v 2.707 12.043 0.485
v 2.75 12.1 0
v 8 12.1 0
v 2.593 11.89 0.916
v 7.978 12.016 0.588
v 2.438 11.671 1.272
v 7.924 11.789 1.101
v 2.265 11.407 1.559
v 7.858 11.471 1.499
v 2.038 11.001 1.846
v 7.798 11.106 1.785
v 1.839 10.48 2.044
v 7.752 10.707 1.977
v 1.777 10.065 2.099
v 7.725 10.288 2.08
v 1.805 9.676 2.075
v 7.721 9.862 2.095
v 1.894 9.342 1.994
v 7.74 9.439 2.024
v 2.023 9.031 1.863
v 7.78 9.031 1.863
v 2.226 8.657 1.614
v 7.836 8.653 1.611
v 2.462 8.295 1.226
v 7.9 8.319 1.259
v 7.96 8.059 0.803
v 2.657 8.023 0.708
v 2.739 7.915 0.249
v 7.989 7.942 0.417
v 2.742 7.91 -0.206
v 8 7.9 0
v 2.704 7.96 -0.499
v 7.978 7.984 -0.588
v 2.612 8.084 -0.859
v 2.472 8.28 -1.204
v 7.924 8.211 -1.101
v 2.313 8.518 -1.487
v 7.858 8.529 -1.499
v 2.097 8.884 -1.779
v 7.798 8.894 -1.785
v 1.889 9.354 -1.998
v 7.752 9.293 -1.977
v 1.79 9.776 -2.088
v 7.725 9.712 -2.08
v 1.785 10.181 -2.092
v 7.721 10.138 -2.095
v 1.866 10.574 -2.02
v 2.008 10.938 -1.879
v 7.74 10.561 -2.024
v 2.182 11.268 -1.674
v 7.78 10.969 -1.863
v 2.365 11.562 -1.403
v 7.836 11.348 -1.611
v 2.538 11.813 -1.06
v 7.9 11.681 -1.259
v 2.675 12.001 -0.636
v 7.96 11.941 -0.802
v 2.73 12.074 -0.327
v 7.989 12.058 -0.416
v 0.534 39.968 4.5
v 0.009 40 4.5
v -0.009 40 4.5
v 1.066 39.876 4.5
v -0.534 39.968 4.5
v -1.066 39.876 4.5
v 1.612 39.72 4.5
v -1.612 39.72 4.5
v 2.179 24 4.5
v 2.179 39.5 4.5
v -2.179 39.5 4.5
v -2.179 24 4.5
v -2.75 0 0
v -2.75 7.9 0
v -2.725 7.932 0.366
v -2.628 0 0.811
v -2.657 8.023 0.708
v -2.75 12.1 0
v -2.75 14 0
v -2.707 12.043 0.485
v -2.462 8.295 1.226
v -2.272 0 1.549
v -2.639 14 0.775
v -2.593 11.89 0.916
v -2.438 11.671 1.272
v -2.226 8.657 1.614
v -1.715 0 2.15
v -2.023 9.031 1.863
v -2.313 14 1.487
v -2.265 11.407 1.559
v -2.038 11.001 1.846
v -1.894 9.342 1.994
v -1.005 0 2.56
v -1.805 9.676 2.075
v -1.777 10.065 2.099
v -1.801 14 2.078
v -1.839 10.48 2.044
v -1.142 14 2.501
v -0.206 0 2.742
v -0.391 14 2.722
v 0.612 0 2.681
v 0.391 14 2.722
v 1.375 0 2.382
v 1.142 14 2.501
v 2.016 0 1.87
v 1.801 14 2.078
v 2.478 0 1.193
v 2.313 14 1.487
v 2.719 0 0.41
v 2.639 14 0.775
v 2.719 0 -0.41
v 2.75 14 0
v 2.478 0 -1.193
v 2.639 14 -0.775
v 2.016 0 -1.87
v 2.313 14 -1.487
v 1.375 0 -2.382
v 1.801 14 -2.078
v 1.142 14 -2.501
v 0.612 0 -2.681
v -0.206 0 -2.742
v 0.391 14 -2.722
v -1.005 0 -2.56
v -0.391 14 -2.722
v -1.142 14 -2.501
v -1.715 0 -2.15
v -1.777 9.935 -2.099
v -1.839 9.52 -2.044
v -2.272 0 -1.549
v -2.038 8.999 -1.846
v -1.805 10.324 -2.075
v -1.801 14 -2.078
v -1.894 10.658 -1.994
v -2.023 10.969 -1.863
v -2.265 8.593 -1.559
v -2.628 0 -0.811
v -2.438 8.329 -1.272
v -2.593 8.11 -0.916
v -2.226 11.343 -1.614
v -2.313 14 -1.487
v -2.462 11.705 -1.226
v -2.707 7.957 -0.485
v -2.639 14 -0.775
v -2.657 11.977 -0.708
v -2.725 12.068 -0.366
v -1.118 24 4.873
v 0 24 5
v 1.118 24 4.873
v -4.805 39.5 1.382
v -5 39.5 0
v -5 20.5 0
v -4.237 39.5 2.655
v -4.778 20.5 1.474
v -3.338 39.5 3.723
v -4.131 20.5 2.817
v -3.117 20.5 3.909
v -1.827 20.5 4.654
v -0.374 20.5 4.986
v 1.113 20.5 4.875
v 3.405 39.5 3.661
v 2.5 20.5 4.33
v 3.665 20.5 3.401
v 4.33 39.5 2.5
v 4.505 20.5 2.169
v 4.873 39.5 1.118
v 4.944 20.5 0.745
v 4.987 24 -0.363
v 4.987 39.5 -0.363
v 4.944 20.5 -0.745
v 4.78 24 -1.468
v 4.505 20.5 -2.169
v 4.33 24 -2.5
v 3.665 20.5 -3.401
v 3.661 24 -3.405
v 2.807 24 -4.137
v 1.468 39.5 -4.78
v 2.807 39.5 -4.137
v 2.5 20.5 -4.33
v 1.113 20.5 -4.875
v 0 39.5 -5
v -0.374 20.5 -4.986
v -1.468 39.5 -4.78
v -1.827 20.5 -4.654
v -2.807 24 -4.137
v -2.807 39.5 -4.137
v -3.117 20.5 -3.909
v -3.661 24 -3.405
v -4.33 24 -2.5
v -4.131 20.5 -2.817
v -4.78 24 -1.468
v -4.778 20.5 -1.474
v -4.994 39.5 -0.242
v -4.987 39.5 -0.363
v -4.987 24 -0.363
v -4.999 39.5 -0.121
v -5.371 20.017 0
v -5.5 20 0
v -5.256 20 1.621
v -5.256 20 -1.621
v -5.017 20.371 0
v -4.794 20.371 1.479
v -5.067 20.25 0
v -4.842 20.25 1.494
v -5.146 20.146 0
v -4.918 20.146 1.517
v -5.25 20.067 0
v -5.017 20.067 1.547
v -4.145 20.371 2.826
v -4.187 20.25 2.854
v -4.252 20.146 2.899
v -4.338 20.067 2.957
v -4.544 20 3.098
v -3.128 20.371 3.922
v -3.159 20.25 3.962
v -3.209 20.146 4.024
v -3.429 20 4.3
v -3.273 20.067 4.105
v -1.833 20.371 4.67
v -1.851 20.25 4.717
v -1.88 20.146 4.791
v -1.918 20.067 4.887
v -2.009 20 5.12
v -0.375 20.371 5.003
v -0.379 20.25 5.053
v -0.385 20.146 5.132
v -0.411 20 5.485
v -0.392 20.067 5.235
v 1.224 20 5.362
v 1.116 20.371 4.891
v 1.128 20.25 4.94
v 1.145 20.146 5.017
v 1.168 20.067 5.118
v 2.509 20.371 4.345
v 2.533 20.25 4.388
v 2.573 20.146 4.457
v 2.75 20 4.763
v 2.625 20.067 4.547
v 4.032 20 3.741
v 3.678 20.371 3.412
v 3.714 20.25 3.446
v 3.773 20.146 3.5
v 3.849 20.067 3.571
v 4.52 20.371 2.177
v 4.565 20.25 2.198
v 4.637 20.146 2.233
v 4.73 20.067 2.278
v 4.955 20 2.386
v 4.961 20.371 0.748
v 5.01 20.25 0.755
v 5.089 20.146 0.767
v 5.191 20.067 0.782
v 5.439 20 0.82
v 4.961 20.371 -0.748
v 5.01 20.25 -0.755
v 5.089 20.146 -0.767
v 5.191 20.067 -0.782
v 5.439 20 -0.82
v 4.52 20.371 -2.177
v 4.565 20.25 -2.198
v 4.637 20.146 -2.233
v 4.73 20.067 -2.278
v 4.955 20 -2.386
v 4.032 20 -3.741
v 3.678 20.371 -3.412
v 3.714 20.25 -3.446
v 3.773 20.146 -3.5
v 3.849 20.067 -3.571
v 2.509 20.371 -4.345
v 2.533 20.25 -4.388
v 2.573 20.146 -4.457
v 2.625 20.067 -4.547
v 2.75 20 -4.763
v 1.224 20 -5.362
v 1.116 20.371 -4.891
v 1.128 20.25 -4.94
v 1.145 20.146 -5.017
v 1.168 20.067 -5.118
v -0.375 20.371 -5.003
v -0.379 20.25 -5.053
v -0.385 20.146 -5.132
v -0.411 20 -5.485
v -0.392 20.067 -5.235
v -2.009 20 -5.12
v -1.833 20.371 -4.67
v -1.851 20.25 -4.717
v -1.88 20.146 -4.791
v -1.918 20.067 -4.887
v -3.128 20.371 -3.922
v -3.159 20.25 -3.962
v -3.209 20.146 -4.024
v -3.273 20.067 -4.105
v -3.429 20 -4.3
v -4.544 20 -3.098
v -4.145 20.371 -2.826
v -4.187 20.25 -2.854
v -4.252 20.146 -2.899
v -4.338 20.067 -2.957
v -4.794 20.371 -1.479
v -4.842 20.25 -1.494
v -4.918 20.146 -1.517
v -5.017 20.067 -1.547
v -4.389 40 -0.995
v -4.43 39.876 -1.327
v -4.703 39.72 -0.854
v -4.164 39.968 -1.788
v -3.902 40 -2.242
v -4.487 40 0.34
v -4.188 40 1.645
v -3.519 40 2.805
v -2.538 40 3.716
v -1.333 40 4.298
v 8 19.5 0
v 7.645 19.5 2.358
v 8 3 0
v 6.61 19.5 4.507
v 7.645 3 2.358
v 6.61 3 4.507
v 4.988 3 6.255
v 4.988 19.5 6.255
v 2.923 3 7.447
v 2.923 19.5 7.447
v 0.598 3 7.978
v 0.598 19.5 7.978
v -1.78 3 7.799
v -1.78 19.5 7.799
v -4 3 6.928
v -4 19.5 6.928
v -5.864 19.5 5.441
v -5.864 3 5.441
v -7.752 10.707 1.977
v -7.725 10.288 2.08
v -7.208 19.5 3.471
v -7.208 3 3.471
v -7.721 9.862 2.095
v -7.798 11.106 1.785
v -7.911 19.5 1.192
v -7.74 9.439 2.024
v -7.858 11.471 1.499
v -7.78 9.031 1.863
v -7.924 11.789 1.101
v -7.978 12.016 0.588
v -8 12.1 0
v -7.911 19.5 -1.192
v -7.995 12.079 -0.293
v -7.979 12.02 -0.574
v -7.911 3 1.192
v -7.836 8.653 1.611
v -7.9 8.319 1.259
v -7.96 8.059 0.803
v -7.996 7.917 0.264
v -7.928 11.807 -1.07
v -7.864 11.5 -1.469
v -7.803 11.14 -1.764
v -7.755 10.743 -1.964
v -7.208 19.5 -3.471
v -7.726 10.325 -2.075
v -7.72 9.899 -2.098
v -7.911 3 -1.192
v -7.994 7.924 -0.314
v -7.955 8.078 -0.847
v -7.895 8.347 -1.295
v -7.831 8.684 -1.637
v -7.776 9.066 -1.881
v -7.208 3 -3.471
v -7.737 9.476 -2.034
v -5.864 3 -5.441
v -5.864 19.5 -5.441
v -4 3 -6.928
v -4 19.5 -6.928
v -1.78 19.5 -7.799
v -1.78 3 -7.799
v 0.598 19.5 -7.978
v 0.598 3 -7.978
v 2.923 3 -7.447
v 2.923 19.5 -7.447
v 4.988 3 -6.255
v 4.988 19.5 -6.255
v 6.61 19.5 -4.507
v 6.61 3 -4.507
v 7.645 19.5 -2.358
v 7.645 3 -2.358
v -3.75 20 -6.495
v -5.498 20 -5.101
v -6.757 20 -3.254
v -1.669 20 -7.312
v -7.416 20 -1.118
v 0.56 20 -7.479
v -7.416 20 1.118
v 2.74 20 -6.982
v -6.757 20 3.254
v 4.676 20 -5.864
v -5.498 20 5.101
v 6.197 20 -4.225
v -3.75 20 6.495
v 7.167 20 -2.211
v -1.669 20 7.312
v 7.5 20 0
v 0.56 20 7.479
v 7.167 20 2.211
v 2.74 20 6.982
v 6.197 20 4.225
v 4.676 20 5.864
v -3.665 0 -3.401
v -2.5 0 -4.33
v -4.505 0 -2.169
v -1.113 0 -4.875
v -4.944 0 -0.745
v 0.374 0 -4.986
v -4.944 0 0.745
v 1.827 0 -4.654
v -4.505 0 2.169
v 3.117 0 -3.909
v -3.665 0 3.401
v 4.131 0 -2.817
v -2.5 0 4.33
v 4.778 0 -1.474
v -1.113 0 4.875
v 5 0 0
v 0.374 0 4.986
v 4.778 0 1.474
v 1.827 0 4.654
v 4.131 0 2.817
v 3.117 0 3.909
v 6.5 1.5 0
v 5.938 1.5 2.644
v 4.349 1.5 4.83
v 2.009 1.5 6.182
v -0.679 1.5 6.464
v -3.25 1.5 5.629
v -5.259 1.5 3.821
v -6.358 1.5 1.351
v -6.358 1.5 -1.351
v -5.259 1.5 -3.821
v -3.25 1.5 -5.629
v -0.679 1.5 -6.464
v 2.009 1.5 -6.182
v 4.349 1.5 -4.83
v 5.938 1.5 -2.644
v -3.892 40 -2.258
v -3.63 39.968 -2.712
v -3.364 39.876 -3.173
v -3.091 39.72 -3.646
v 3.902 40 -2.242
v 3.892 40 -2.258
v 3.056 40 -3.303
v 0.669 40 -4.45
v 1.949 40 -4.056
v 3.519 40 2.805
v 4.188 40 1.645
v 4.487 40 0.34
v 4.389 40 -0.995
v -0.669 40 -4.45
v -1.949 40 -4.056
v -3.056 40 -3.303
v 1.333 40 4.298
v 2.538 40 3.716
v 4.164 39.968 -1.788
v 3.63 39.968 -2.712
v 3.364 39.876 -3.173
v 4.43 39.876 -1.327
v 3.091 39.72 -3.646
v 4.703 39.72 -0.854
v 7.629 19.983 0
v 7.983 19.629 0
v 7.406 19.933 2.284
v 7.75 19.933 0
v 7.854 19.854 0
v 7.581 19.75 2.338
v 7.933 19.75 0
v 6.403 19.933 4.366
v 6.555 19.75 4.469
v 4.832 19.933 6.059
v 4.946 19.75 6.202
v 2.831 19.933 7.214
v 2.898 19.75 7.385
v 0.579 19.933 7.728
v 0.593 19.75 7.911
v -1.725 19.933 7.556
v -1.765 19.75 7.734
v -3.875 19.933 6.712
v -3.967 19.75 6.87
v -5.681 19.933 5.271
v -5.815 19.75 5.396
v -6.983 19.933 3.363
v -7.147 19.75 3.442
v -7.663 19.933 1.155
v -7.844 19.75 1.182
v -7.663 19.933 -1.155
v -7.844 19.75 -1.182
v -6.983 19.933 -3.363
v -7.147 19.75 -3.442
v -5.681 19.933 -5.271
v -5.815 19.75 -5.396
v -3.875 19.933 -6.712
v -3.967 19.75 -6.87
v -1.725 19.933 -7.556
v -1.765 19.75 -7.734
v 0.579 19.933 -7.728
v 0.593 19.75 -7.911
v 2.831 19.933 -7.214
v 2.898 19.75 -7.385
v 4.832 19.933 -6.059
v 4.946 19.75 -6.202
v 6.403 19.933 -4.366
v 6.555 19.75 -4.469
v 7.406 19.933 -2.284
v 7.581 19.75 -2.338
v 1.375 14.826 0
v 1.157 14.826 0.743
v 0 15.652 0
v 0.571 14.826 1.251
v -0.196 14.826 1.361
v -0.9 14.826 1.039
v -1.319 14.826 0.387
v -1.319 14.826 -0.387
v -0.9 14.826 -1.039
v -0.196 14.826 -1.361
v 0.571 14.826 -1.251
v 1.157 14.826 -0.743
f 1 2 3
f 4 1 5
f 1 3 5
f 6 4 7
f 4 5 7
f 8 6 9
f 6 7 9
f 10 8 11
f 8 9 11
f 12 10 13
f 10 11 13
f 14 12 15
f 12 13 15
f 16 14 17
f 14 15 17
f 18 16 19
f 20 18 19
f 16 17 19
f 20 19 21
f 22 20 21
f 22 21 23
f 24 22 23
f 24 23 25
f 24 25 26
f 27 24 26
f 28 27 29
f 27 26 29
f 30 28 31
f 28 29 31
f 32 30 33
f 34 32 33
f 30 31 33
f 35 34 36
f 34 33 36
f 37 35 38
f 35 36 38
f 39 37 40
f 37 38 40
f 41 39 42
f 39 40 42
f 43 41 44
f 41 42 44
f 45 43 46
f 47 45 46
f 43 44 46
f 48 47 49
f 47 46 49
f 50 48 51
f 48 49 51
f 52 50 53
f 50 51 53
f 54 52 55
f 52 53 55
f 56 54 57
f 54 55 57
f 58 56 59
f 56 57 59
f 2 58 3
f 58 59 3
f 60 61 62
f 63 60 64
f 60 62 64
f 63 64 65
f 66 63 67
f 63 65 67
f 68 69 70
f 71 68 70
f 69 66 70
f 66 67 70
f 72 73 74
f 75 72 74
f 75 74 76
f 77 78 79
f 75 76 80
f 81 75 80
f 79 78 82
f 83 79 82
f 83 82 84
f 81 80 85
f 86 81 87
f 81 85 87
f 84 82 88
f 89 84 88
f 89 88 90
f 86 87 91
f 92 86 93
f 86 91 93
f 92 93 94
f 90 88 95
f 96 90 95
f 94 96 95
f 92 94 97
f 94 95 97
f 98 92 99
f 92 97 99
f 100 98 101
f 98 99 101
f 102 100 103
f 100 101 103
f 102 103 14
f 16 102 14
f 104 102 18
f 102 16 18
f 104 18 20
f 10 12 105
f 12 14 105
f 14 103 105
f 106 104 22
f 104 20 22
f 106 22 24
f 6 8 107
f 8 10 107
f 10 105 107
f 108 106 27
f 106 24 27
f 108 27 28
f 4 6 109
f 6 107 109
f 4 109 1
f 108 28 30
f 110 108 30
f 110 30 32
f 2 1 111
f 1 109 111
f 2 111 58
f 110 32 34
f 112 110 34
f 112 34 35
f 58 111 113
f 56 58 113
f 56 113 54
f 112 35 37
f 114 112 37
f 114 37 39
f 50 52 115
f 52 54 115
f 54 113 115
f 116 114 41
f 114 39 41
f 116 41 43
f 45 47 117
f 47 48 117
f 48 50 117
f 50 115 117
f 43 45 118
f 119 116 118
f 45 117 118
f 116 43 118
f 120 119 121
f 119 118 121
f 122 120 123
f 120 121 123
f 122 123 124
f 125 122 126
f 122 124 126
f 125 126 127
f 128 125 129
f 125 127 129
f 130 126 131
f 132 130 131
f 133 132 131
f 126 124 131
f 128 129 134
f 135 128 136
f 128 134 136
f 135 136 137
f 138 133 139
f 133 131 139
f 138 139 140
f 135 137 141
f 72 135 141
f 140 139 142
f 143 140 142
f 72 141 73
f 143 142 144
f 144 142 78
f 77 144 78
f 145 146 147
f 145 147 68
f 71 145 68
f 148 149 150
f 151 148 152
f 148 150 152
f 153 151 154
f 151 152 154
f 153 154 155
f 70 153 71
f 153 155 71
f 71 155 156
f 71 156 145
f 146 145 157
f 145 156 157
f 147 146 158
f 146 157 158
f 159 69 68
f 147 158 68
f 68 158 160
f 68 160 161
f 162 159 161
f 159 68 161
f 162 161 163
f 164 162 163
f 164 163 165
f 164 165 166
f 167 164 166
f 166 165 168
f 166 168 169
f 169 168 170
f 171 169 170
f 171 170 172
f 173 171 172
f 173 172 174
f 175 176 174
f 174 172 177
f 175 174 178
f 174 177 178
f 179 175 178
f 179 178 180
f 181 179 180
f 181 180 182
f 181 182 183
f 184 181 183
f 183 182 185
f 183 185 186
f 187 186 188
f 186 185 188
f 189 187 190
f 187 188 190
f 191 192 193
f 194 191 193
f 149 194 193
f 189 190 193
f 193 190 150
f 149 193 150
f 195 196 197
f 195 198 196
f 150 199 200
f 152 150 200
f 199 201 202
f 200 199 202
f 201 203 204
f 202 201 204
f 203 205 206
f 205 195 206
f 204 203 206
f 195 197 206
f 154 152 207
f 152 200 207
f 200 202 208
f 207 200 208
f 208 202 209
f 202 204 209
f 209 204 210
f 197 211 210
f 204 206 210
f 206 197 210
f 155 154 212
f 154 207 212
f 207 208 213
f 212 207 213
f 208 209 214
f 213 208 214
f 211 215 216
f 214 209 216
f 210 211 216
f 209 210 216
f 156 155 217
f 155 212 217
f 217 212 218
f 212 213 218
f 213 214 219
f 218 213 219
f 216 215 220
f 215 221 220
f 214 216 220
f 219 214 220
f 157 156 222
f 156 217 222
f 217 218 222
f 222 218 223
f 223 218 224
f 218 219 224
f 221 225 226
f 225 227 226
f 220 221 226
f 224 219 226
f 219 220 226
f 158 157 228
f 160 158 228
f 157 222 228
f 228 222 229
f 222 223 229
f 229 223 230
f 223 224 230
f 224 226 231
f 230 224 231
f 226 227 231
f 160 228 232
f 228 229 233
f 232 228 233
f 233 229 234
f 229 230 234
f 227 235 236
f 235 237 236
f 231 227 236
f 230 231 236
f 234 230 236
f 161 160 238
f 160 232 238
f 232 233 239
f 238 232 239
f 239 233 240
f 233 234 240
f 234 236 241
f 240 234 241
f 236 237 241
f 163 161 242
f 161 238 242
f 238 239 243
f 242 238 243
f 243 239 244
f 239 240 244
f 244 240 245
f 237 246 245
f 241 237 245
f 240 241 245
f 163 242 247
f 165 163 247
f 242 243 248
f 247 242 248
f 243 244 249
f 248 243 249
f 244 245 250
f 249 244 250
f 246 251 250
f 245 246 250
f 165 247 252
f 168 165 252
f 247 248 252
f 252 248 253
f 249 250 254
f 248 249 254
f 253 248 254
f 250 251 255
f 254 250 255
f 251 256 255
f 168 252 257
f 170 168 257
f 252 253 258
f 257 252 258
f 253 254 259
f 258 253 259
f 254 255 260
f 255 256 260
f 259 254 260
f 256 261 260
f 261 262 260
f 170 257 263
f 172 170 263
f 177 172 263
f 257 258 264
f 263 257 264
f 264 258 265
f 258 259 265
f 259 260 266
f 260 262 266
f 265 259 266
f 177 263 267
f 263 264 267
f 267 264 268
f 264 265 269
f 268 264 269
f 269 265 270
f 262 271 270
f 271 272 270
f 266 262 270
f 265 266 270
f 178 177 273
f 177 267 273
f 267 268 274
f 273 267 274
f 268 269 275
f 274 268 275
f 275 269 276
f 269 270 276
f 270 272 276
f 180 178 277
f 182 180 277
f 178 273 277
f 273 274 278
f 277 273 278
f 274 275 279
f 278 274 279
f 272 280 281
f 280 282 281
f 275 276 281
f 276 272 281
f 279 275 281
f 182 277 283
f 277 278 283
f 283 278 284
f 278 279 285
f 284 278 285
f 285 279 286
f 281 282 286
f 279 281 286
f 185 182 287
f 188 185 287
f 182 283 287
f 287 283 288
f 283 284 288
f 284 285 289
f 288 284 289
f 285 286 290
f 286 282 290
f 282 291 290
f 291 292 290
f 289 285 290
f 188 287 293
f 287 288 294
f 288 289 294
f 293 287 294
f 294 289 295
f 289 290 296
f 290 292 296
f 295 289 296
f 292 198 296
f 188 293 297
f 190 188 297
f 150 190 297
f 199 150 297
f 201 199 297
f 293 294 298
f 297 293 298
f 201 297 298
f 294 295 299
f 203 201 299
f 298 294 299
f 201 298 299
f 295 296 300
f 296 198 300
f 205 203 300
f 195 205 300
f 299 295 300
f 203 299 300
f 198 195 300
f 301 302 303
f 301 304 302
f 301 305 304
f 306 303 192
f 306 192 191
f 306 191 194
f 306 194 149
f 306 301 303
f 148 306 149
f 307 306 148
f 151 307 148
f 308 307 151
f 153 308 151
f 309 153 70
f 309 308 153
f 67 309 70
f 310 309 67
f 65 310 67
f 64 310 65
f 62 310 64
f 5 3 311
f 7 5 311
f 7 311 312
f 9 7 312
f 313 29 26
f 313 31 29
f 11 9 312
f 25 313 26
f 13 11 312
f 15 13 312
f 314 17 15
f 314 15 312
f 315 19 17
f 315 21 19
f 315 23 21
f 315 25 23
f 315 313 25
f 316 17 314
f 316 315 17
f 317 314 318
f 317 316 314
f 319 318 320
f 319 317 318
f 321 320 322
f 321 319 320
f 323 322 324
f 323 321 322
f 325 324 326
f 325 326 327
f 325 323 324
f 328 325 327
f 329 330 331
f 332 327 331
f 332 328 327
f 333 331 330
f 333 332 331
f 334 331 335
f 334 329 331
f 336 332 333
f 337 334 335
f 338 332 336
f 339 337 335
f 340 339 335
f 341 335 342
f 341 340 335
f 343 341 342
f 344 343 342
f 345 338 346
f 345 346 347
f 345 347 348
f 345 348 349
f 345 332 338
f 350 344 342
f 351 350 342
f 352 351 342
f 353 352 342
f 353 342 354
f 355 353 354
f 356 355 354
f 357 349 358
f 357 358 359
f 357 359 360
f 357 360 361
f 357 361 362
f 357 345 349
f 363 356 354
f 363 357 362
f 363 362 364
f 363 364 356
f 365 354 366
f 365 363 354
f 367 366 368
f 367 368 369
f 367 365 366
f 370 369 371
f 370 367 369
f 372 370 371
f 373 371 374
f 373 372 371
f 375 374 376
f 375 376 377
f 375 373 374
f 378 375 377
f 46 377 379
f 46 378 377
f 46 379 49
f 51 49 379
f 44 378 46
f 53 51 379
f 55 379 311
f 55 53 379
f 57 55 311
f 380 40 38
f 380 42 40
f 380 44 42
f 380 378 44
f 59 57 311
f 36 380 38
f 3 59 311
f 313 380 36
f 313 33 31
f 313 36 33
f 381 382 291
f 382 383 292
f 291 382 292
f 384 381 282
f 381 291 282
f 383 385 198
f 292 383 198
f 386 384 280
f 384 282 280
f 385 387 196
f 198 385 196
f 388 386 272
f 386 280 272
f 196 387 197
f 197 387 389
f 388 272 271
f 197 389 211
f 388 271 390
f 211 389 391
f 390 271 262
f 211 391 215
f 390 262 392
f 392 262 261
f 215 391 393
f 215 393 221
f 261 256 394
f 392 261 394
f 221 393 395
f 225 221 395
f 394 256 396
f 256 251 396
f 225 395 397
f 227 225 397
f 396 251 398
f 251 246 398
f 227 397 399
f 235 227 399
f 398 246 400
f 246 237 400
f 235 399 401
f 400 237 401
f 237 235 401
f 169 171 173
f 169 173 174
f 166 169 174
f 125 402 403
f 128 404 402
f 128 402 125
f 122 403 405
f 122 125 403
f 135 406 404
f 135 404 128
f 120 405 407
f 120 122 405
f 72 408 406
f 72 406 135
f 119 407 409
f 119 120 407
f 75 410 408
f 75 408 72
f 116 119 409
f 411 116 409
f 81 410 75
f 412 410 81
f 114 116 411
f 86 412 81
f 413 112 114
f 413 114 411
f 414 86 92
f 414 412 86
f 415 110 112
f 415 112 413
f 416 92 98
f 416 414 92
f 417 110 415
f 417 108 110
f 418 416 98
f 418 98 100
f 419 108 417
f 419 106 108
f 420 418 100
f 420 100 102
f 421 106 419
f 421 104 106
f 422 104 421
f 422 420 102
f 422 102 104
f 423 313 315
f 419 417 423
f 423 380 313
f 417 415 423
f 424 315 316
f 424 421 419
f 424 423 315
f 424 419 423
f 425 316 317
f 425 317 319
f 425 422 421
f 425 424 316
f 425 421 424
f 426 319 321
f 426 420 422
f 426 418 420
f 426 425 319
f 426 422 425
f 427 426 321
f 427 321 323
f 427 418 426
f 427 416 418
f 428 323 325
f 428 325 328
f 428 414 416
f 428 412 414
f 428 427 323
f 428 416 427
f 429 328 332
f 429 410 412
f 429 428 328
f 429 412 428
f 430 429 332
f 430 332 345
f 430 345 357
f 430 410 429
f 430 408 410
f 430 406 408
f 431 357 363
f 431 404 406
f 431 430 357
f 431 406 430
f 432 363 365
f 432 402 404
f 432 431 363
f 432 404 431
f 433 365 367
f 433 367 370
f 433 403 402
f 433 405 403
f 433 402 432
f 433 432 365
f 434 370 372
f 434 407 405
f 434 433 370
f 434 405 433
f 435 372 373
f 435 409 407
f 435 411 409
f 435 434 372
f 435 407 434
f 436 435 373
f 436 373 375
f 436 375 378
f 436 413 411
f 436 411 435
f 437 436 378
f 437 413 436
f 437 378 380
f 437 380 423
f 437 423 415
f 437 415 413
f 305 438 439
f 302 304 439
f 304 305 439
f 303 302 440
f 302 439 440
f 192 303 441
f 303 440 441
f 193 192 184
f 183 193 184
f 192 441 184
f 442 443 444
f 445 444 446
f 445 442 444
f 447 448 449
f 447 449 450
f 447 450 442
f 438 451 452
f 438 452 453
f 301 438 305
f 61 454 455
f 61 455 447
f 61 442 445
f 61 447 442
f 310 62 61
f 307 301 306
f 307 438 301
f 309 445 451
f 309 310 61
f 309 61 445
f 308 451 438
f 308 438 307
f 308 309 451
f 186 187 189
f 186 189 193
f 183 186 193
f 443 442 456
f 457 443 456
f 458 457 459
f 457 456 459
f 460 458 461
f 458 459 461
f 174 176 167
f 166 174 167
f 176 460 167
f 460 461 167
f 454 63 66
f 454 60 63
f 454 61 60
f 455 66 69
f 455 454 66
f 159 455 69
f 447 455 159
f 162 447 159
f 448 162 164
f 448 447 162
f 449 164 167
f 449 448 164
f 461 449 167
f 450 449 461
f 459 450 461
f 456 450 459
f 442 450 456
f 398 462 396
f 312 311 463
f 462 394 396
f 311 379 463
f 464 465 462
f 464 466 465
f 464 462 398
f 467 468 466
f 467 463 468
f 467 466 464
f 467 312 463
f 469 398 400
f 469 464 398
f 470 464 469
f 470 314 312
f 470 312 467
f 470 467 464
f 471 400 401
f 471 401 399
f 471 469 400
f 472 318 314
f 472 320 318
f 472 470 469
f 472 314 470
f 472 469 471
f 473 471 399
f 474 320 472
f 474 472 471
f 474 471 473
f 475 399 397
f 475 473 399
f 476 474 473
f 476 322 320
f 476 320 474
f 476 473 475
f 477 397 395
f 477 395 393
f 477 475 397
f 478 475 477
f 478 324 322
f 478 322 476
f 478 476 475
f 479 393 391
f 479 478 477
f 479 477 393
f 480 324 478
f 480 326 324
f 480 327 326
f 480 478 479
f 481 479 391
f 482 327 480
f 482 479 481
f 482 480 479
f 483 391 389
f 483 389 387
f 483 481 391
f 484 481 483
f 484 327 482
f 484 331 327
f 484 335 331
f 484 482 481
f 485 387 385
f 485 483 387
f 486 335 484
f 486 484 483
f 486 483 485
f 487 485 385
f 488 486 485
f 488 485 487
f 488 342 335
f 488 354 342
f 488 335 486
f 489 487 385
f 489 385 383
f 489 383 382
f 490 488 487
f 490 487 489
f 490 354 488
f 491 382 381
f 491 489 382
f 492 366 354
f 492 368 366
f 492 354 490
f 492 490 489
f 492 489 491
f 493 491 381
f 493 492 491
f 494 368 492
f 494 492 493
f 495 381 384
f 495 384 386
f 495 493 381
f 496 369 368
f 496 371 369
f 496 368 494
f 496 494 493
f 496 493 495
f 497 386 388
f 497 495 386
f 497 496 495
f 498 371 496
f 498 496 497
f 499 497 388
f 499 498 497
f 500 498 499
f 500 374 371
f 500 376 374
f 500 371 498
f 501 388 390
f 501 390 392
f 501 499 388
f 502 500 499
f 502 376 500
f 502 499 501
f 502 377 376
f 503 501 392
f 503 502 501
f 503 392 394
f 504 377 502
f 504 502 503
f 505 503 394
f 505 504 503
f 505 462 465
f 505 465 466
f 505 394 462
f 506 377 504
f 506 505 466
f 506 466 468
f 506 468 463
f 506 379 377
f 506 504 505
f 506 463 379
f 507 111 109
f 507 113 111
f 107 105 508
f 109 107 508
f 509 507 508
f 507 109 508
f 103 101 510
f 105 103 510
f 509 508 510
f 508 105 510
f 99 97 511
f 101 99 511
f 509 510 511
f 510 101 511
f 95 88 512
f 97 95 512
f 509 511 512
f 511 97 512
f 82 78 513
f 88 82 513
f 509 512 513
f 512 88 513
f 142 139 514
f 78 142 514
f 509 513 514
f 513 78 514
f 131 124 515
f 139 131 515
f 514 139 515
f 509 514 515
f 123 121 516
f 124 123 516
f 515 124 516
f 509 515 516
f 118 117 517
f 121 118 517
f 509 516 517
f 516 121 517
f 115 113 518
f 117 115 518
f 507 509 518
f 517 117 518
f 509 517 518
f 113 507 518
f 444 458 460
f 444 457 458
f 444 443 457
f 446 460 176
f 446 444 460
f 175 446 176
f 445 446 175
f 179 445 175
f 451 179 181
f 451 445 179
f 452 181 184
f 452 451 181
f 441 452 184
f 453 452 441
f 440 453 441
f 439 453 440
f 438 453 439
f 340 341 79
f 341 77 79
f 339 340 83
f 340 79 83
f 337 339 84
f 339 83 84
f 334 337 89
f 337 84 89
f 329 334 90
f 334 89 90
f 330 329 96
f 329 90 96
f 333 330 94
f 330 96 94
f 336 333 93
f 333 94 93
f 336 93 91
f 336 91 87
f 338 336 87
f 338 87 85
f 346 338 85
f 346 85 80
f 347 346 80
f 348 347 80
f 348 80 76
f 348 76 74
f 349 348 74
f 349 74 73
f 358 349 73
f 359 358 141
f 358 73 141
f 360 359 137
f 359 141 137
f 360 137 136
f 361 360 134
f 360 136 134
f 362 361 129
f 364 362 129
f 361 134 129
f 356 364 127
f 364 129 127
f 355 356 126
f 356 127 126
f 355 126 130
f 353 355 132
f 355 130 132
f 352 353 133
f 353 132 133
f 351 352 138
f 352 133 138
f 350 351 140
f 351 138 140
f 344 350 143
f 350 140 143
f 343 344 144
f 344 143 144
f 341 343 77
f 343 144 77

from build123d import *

# Parameters (mm, degrees)
F0_R            = 8
F1_DEPTH        = 20
F2_R            = 5
F3_DEPTH        = 20
F5_DEPTH        = 16
F5_COPIES_COUNT = 3
F6_SIZE         = 0.49999
F7_R            = 0.5
F9_D            = 5.5
F9_DEPTH        = 14
F9_TIP          = 1.6523667023
F10_R           = 2.1
F11_DEPTH       = 8.25
F12_SIZE        = 3


# Not quite as in the source:
# - a fillet or chamfer is up to 0.001 mm smaller than in the source, because OpenCascade refuses the exact size
# - a pattern or mirror of a feature is missing from the dataset's text; its kind, count and spacing are read off the source's solid


with BuildPart() as f1:
    # F0 (on Front) → F1 (new body)
    with BuildSketch(Plane.XZ):
        Circle(F0_R)
    extrude(amount=-F1_DEPTH)

    # F2 (on face) → F3 (join)
    with BuildSketch(Plane(origin=(0, 20, 0), x_dir=(-1, 0, 0), z_dir=(0, 1, 0))):
        Circle(F2_R)
    extrude(amount=F3_DEPTH)

    # F4 (on face) → F5 (cut)
    with BuildSketch(Plane(origin=(0, 40, 0), x_dir=(-1, 0, 0), z_dir=(0, 1, 0))):
        with BuildLine():
            ThreePointArc((2.1794494718, 4.5), (0, 5), (-2.1794494718, 4.5))
            Line((-2.1794494718, 4.5), (2.1794494718, 4.5))
        make_face()
    f5 = extrude(amount=-F5_DEPTH, mode=Mode.SUBTRACT)

    # F5_copies: F5 ×3 about axis
    f5_copies_axis = Axis((0, 0, 0), (0, 1, 0))
    for i in range(1, F5_COPIES_COUNT):
        add(f5.rotate(f5_copies_axis, i * 360 / F5_COPIES_COUNT), mode=Mode.SUBTRACT)

    # F6 (size 0.5 in the source; OpenCascade refuses exactly that, so slightly less here)
    f6_edges = [f1.edges().sort_by_distance(p)[0] for p in [
        (4.330127, 40, 2.5),
        (-4.996709, 40, -0.18139),
        (0, 40, -5),
        (-4.236582, 40, 2.655443),
    ]]
    chamfer(f6_edges, length=F6_SIZE)

    # F7
    f7_edges = [f1.edges().sort_by_distance(p)[0] for p in [
        (-8, 20, 0),
        (5, 20, 0),
    ]]
    fillet(f7_edges, radius=F7_R)

    # F9
    with Locations(Plane.XZ):
        with Locations((0, 0)):
            Hole(F9_D / 2, depth=F9_DEPTH)
            with Locations((0, 0, -(F9_DEPTH + F9_TIP / 2))):  # 118° drill point
                Cone(0, F9_D / 2, F9_TIP, mode=Mode.SUBTRACT)

    # F10 (on Right) → F11 (cut, symmetric)
    with BuildSketch(Plane.YZ):
        with Locations((10, 0)):
            Circle(F10_R)
    extrude(amount=F11_DEPTH, both=True, mode=Mode.SUBTRACT)

    # F12
    f12_edges = [f1.edges().sort_by_distance(p)[0] for p in [
        (-8, 0, 0),
    ]]
    chamfer(f12_edges, length=F12_SIZE)


solid = f1.part
